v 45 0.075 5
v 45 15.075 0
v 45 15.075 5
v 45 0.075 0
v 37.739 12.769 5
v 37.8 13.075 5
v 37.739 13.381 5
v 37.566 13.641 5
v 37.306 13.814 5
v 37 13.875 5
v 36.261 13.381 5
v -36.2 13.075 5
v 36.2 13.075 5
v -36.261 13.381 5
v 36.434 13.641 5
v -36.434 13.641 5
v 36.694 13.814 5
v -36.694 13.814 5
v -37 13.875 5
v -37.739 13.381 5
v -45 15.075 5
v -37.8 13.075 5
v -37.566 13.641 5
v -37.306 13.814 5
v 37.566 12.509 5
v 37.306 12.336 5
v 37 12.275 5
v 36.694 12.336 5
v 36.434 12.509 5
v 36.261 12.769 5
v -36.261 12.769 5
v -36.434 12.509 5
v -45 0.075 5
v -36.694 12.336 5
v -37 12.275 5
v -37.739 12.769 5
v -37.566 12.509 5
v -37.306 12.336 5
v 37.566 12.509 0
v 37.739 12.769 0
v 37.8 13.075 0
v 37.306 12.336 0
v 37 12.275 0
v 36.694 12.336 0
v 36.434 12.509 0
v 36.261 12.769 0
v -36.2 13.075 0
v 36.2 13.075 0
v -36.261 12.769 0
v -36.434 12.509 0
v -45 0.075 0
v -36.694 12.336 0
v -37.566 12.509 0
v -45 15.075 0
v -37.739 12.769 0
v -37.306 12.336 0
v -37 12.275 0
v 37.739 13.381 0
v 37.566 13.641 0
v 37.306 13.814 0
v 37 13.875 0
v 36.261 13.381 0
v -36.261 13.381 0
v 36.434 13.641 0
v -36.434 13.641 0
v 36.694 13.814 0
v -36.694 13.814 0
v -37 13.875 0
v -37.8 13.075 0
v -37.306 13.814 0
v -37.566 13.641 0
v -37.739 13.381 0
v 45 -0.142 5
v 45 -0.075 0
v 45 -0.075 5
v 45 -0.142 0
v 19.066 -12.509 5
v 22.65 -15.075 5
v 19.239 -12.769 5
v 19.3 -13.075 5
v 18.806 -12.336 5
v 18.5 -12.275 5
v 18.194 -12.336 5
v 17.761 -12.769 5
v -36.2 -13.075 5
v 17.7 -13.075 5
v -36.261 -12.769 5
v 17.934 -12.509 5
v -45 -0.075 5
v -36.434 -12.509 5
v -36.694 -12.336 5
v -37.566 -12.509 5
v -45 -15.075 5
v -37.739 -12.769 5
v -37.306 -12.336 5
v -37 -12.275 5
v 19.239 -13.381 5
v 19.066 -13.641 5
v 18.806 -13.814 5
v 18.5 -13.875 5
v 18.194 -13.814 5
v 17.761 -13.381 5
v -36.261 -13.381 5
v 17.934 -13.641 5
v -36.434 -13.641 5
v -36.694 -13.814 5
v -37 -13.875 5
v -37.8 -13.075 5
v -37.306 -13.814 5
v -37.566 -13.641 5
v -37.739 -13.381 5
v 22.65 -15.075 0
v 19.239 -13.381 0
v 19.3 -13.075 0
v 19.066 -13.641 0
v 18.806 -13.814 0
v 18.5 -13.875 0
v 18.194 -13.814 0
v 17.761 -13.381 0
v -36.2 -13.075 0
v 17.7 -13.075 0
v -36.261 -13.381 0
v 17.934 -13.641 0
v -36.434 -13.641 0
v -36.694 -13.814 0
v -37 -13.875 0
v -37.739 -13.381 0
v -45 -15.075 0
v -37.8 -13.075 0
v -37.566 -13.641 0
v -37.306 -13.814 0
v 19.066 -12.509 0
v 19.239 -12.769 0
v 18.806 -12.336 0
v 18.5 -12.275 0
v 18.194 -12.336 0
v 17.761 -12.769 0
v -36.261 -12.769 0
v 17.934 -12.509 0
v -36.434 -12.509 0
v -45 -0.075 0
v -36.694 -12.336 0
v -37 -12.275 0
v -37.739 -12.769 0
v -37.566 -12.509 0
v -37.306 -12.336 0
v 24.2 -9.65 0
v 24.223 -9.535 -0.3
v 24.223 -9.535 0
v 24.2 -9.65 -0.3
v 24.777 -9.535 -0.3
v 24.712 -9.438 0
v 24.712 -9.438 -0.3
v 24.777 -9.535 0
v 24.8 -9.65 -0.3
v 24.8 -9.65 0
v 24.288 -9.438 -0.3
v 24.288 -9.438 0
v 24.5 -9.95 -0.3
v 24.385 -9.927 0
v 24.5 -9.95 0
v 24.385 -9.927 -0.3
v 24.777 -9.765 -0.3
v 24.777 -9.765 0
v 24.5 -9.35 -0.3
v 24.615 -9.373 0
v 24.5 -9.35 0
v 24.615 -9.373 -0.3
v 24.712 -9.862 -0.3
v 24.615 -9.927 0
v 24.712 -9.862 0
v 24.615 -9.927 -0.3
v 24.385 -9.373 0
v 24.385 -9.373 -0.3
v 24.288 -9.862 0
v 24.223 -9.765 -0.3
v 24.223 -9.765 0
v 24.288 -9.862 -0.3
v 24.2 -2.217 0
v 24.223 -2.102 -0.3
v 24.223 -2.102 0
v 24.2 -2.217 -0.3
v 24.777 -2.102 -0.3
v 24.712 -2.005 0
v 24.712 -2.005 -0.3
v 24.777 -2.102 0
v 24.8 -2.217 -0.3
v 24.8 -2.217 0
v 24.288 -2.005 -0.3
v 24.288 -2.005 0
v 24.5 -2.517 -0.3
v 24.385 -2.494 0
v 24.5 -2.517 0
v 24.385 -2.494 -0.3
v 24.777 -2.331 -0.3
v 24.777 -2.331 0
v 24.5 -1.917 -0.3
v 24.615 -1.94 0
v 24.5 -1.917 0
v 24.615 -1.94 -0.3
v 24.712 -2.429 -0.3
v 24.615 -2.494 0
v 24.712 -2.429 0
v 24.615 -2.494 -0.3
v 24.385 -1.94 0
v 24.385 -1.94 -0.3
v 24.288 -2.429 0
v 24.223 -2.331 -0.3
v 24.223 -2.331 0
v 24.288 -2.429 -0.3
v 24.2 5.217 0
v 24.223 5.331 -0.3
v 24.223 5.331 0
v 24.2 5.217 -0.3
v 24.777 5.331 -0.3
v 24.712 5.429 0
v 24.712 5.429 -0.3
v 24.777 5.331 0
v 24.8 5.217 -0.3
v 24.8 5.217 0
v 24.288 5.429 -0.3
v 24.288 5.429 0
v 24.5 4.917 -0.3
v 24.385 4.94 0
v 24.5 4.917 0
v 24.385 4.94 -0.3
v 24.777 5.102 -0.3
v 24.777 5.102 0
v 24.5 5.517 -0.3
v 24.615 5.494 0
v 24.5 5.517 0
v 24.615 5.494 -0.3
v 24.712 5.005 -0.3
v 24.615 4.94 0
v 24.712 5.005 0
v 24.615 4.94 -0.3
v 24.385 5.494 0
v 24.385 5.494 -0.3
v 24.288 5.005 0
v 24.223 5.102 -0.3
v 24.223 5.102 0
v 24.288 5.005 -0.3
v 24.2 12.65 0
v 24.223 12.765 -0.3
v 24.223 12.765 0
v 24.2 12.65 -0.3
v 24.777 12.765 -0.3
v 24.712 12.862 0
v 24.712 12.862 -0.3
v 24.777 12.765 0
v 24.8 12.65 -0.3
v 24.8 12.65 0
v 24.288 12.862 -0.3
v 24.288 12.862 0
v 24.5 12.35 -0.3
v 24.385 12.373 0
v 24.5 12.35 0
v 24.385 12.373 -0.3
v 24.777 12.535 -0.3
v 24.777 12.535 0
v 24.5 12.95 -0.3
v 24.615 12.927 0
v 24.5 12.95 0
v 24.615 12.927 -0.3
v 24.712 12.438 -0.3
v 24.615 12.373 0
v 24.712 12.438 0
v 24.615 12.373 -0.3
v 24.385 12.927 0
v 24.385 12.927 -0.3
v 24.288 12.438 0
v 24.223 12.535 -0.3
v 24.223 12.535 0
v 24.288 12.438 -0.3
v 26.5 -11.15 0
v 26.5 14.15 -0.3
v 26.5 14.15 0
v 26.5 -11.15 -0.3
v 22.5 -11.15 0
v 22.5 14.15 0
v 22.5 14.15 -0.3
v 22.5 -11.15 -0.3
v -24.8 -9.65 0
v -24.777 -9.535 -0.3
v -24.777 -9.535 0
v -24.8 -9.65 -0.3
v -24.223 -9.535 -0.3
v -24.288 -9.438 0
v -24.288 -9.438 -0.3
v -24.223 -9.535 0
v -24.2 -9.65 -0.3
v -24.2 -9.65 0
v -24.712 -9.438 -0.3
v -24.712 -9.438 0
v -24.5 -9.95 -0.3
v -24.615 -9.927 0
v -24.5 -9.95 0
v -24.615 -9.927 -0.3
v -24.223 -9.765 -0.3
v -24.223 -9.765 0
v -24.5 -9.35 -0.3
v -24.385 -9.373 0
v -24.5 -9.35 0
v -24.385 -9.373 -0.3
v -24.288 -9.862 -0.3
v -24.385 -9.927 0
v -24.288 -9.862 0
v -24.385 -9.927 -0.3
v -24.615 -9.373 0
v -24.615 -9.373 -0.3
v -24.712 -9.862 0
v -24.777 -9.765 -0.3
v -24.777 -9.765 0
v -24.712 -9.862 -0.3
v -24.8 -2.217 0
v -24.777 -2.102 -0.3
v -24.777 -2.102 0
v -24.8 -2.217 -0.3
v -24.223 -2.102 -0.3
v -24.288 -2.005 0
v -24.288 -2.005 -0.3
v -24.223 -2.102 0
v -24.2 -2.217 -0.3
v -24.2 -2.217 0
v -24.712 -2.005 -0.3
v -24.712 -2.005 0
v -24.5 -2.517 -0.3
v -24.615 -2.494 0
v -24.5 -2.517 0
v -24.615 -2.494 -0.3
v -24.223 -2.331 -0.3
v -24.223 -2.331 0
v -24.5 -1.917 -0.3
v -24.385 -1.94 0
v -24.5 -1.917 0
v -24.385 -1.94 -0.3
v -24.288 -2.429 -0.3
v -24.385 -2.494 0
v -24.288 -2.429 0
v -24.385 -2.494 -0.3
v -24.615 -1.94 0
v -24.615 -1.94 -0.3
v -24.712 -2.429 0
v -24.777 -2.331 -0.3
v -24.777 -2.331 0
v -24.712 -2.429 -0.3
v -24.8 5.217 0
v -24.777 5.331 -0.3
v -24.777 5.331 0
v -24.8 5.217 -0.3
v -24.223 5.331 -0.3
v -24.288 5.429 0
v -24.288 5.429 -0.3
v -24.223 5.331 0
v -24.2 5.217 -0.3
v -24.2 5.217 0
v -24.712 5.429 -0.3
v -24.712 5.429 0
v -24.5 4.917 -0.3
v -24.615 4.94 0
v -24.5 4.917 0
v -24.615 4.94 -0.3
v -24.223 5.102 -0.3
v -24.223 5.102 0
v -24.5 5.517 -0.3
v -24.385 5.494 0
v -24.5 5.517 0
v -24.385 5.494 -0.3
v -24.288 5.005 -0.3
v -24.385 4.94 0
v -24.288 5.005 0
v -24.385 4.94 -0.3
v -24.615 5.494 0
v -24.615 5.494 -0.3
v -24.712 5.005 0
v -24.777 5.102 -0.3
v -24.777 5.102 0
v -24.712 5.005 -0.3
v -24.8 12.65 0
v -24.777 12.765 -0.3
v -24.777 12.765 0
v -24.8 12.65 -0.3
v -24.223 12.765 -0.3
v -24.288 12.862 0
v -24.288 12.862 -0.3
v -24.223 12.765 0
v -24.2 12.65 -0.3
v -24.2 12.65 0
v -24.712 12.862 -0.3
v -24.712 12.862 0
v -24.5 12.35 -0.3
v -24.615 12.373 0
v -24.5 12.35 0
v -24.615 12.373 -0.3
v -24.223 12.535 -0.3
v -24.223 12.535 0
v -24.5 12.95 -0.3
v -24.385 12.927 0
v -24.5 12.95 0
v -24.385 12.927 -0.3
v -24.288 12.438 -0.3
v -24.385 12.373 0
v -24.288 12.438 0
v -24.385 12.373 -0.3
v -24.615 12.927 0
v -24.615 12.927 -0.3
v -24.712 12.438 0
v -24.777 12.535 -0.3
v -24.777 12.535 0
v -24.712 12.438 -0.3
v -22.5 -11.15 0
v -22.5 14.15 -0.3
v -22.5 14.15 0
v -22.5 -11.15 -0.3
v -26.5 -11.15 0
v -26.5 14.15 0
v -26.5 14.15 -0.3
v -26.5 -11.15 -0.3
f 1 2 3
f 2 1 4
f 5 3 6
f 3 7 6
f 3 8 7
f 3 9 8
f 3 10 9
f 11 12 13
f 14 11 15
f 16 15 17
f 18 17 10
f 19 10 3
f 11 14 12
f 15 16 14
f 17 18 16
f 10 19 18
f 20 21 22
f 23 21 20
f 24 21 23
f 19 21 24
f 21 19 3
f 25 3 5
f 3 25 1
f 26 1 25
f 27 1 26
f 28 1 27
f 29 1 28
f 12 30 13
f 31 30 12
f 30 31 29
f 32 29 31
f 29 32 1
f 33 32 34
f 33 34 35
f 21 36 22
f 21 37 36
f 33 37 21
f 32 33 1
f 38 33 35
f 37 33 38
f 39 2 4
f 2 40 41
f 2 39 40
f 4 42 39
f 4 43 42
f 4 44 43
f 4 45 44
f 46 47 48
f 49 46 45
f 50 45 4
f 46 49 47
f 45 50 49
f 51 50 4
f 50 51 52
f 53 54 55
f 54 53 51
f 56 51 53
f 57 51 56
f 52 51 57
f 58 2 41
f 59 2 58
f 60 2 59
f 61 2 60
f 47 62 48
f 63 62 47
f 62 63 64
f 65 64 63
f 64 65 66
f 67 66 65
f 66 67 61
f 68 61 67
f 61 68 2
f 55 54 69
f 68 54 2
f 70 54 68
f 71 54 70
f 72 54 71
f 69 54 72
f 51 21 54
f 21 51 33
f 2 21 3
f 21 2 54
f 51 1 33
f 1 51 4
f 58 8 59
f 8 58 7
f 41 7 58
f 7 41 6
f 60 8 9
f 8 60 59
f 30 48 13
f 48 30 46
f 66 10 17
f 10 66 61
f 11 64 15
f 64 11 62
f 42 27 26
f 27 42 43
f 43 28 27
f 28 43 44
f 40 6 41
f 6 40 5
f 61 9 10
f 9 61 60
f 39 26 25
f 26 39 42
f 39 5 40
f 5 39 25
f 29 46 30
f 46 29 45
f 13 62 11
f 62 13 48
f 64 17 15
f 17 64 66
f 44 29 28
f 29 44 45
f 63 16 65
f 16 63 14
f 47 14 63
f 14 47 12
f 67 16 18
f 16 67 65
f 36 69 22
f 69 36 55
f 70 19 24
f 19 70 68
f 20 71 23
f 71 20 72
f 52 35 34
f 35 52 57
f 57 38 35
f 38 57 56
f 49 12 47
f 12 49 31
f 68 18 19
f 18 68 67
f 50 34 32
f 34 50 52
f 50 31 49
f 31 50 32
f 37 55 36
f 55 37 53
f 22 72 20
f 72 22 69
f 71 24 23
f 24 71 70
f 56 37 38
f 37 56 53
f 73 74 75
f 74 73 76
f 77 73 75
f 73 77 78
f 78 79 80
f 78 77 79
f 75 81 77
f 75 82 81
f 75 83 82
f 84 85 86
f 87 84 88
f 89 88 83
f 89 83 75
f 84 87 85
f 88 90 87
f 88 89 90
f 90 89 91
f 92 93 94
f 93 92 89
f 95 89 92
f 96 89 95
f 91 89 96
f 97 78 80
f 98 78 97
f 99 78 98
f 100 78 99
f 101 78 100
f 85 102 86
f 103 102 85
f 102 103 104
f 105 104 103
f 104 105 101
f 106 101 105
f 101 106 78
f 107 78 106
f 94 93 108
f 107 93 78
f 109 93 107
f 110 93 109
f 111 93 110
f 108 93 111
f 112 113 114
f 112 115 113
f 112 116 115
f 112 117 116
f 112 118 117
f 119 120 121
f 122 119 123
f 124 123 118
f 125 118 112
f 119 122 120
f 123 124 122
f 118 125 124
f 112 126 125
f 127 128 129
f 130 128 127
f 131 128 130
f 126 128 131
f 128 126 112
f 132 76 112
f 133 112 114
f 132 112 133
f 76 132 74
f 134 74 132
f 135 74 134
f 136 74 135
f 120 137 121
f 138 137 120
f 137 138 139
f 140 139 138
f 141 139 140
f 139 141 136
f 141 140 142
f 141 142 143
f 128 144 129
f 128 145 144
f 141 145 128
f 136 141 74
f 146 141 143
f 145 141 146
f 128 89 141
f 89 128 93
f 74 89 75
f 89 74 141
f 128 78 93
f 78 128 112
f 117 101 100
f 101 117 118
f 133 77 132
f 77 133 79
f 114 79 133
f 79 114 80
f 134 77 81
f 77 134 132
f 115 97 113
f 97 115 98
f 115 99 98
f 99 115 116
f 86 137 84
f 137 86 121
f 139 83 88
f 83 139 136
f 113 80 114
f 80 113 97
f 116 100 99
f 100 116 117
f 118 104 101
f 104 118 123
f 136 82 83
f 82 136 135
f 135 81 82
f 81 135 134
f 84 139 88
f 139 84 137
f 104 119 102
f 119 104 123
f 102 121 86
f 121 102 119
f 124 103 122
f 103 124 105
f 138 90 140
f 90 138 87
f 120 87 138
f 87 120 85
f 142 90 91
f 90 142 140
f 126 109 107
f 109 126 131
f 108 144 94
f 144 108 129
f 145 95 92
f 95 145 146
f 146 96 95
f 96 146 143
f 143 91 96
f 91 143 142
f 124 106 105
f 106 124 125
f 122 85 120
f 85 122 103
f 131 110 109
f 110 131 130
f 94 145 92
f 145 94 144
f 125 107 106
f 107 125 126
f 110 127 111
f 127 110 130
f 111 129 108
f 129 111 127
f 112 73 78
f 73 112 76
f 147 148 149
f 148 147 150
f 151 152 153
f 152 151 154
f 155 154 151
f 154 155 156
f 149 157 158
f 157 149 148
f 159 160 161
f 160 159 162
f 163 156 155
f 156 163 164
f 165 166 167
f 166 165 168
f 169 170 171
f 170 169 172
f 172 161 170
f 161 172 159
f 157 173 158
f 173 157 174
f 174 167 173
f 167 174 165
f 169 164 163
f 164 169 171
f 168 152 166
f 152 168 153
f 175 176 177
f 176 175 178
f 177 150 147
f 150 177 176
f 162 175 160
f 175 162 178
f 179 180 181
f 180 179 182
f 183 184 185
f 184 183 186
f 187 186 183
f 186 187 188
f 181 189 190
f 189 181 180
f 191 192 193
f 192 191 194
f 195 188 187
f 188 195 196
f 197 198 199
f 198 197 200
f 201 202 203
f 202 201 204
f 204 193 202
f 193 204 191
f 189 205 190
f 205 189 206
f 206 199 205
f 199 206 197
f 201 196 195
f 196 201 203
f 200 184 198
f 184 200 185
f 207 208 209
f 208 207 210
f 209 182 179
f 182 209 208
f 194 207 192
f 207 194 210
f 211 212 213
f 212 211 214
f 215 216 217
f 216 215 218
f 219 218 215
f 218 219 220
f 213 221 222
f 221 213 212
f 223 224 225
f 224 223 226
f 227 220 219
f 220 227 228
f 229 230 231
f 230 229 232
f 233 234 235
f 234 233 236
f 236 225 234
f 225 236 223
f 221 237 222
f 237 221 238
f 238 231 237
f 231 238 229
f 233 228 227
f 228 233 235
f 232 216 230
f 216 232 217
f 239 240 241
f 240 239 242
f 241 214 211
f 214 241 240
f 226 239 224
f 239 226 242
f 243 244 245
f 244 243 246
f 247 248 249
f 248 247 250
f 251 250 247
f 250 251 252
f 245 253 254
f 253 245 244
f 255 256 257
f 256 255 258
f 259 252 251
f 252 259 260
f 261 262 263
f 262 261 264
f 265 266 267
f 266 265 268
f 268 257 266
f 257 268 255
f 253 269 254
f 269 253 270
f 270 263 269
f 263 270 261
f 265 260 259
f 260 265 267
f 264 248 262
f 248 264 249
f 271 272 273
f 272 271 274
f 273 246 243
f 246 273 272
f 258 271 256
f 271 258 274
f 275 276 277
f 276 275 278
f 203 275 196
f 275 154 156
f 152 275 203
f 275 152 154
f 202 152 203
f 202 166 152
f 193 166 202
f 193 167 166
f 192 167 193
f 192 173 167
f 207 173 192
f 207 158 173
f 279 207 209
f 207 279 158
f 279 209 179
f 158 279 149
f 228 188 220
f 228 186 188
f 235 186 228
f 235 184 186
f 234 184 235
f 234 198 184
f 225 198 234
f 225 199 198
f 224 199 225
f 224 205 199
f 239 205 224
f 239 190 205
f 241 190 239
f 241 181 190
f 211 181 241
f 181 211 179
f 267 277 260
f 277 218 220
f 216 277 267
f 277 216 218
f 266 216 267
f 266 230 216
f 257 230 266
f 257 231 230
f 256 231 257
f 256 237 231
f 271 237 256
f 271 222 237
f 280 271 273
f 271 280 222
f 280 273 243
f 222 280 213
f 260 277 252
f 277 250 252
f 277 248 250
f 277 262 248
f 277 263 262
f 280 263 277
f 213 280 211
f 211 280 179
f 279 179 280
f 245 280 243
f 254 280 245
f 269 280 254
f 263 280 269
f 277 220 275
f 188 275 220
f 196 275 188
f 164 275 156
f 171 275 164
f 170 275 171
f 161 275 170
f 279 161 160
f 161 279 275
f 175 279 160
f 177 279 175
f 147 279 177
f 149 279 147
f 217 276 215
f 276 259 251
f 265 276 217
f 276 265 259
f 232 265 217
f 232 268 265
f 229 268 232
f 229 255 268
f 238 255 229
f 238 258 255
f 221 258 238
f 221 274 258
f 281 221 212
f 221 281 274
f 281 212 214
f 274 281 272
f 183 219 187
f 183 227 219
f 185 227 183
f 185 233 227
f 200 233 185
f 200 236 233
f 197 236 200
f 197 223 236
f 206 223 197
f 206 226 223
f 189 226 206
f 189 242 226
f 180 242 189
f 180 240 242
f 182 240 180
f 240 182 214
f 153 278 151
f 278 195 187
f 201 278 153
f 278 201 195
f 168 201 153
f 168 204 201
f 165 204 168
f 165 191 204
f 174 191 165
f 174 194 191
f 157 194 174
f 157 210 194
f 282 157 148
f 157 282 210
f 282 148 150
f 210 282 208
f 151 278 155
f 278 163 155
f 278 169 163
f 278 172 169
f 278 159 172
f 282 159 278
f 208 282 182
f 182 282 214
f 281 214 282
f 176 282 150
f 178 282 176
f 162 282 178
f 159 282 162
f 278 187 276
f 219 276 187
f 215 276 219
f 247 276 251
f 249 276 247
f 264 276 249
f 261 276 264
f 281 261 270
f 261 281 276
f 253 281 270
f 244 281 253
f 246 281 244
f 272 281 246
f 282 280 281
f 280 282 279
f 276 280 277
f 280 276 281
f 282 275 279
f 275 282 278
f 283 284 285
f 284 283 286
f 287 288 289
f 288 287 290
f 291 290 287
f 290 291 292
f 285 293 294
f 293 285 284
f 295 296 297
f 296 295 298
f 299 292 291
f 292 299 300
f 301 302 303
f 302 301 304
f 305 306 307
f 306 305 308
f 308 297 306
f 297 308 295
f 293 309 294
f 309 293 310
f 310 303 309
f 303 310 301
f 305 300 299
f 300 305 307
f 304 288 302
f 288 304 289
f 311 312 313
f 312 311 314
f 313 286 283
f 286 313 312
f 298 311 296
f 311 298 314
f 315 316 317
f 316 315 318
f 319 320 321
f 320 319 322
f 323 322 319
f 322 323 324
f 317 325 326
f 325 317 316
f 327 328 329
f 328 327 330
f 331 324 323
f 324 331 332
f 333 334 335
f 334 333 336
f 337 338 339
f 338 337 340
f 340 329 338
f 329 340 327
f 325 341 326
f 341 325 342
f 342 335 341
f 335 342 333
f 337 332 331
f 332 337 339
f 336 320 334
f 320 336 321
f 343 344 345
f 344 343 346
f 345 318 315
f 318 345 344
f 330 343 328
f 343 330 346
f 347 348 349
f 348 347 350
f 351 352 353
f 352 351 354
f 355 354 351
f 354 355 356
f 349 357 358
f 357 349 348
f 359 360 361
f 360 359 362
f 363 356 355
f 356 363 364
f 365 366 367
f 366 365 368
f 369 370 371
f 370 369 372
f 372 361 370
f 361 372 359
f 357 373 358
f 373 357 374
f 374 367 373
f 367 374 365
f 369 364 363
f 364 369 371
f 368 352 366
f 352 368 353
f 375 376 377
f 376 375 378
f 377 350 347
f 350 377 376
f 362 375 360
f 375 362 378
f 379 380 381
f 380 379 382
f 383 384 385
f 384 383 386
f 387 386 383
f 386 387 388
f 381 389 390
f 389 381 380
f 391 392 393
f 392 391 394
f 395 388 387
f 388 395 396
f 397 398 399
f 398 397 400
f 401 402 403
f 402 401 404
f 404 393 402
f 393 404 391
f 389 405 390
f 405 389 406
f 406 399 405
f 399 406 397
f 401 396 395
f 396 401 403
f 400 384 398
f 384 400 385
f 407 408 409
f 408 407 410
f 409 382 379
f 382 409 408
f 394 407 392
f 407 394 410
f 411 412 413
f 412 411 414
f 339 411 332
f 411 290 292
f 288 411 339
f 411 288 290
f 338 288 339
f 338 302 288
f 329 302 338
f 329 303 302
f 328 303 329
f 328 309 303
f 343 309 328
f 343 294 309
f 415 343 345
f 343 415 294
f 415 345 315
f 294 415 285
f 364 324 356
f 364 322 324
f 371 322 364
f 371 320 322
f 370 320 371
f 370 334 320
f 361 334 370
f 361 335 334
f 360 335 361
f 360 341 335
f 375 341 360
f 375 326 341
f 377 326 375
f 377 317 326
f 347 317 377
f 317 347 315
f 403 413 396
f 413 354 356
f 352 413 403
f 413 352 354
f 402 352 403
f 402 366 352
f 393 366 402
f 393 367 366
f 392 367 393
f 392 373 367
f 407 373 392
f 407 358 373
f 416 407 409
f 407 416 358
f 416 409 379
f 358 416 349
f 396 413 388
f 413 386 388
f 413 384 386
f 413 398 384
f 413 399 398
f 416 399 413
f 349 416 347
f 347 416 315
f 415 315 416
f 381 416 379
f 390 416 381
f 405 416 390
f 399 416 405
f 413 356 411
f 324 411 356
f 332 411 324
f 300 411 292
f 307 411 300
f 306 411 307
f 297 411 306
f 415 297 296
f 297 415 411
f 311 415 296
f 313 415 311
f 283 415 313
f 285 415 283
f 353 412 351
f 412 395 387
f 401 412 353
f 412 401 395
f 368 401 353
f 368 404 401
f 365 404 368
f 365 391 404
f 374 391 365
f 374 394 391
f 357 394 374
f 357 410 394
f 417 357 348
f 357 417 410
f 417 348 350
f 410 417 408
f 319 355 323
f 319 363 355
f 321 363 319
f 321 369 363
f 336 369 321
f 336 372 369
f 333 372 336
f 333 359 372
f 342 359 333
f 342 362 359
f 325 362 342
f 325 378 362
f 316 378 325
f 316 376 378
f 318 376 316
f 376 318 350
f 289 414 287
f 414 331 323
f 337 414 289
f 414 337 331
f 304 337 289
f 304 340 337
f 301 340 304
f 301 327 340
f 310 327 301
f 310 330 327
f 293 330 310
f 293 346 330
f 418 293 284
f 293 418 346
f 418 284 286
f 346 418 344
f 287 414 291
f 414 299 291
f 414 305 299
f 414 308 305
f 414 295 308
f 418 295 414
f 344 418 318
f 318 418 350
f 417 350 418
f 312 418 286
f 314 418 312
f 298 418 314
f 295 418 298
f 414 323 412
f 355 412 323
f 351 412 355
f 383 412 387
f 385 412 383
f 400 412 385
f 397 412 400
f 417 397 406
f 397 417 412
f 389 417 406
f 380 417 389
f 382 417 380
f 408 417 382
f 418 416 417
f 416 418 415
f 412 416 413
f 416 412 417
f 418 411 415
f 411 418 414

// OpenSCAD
module shelf(shelf_w = 90, wood_w = 15, wood_t = 5, gap = 0.3, pipe_dx=8, pipe_dy=2, pipe_diam = 1.6,is_bottom_shelf=false)
{
    translate([0, wood_w/2+gap/4, wood_t/2])
        onewood(shelf_w, wood_w, wood_t, gap, pipe_dx, pipe_dy, pipe_diam, false);

    translate([0, -wood_w/2-gap/4, wood_t/2])
        onewood(shelf_w, wood_w, wood_t, gap, pipe_dx, pipe_dy, pipe_diam, true);

    if (!is_bottom_shelf)
    {
        translate([shelf_w/4+2, 0, 0]) 
        ironbrace(2*wood_w+gap);
        
        translate([-shelf_w/4-2, 0, 0]) 
        ironbrace(2*wood_w+gap);
    }
    
    if (is_bottom_shelf)
    {
        brace_w = 4;
        brace_t = 0.3;
        screw_hole_diam = 0.6;
        translate([shelf_w/2-pipe_dx, wood_w+gap/2-3.5/2*brace_w-0.5, -brace_t/2]) difference()
        {
            color([0.23,0.12,0.10, 1.0])
            cube([brace_w, 3.5*brace_w, brace_t], center=true);
        
            translate([0.3*brace_w,1.6*brace_w, 0])
            cylinder(h=brace_t+0.5,r=screw_hole_diam/2,center = true, $fn = 16);
            translate([0,0.6*brace_w, 0])
            cylinder(h=brace_t+0.5,r=screw_hole_diam/2,center = true, $fn = 16);
            translate([0,-brace_w, 0])
            cylinder(h=brace_t+0.5,r=screw_hole_diam/2,center = true, $fn = 16);
        }
    }
}        

module onewood(shelf_w, wood_w, wood_t, gap, pipe_dx, pipe_dy, pipe_diam, is_front)
{
    hole_y = is_front ? -wood_w/2+pipe_dy : wood_w/2-pipe_dy;
    right_hole_x = is_front ? shelf_w/4-pipe_dx/2 : shelf_w/2-pipe_dx;
    difference()
    {
        color([0.75,0.48,0.19, 1.0])
        translate([0,0,0])
        cube([shelf_w, wood_w, wood_t], center=true);
        
        translate([right_hole_x, hole_y,0])
        cylinder(h=wood_t+0.5,r=pipe_diam/2,center = true, $fn = 16);

        translate([-shelf_w/2+pipe_dx, hole_y,0])
        cylinder(h=wood_t+0.5,r=pipe_diam/2,center = true, $fn = 16);
        if (is_front) 
        {
            translate([0,0,-wood_t/2-0.2])
            color([0.51,0.38,0.19, 1.0])
            linear_extrude(wood_t+0.4) 
            polygon(points=[[shelf_w/4, -wood_w/2-0.1],[shelf_w/2+0.1,wood_w/2],[shelf_w/2+0.1,-wood_w/2-0.1],[shelf_w/4, -wood_w/2-0.1]]);
        }
    }
}   

module ironbrace(shelf_depth)
{
    brace_w = 4;
    brace_t = 0.3;
    brace_d1 = 4;
    brace_d2 = 1;
    n_screw_holes = 4;
    brace_l = shelf_depth - brace_d1 - brace_d2;
    screw_range = brace_l - 3;
    screw_step = screw_range/(n_screw_holes-1);
    first_screw = -screw_range/2;
    screw_hole_diam = 0.6;

    translate([0,(brace_d1-brace_d2)/2,-brace_t/2]) difference()
    {
        color([0.23,0.12,0.10, 1.0])
        cube([brace_w, brace_l, brace_t], center=true);
        
        for (x = [0: n_screw_holes-1]) {
            translate([0,x * screw_step + first_screw, 0])
            cylinder(h=brace_t+0.5,r=screw_hole_diam/2,center = true, $fn = 16);
        }
    }
}

shelf();
